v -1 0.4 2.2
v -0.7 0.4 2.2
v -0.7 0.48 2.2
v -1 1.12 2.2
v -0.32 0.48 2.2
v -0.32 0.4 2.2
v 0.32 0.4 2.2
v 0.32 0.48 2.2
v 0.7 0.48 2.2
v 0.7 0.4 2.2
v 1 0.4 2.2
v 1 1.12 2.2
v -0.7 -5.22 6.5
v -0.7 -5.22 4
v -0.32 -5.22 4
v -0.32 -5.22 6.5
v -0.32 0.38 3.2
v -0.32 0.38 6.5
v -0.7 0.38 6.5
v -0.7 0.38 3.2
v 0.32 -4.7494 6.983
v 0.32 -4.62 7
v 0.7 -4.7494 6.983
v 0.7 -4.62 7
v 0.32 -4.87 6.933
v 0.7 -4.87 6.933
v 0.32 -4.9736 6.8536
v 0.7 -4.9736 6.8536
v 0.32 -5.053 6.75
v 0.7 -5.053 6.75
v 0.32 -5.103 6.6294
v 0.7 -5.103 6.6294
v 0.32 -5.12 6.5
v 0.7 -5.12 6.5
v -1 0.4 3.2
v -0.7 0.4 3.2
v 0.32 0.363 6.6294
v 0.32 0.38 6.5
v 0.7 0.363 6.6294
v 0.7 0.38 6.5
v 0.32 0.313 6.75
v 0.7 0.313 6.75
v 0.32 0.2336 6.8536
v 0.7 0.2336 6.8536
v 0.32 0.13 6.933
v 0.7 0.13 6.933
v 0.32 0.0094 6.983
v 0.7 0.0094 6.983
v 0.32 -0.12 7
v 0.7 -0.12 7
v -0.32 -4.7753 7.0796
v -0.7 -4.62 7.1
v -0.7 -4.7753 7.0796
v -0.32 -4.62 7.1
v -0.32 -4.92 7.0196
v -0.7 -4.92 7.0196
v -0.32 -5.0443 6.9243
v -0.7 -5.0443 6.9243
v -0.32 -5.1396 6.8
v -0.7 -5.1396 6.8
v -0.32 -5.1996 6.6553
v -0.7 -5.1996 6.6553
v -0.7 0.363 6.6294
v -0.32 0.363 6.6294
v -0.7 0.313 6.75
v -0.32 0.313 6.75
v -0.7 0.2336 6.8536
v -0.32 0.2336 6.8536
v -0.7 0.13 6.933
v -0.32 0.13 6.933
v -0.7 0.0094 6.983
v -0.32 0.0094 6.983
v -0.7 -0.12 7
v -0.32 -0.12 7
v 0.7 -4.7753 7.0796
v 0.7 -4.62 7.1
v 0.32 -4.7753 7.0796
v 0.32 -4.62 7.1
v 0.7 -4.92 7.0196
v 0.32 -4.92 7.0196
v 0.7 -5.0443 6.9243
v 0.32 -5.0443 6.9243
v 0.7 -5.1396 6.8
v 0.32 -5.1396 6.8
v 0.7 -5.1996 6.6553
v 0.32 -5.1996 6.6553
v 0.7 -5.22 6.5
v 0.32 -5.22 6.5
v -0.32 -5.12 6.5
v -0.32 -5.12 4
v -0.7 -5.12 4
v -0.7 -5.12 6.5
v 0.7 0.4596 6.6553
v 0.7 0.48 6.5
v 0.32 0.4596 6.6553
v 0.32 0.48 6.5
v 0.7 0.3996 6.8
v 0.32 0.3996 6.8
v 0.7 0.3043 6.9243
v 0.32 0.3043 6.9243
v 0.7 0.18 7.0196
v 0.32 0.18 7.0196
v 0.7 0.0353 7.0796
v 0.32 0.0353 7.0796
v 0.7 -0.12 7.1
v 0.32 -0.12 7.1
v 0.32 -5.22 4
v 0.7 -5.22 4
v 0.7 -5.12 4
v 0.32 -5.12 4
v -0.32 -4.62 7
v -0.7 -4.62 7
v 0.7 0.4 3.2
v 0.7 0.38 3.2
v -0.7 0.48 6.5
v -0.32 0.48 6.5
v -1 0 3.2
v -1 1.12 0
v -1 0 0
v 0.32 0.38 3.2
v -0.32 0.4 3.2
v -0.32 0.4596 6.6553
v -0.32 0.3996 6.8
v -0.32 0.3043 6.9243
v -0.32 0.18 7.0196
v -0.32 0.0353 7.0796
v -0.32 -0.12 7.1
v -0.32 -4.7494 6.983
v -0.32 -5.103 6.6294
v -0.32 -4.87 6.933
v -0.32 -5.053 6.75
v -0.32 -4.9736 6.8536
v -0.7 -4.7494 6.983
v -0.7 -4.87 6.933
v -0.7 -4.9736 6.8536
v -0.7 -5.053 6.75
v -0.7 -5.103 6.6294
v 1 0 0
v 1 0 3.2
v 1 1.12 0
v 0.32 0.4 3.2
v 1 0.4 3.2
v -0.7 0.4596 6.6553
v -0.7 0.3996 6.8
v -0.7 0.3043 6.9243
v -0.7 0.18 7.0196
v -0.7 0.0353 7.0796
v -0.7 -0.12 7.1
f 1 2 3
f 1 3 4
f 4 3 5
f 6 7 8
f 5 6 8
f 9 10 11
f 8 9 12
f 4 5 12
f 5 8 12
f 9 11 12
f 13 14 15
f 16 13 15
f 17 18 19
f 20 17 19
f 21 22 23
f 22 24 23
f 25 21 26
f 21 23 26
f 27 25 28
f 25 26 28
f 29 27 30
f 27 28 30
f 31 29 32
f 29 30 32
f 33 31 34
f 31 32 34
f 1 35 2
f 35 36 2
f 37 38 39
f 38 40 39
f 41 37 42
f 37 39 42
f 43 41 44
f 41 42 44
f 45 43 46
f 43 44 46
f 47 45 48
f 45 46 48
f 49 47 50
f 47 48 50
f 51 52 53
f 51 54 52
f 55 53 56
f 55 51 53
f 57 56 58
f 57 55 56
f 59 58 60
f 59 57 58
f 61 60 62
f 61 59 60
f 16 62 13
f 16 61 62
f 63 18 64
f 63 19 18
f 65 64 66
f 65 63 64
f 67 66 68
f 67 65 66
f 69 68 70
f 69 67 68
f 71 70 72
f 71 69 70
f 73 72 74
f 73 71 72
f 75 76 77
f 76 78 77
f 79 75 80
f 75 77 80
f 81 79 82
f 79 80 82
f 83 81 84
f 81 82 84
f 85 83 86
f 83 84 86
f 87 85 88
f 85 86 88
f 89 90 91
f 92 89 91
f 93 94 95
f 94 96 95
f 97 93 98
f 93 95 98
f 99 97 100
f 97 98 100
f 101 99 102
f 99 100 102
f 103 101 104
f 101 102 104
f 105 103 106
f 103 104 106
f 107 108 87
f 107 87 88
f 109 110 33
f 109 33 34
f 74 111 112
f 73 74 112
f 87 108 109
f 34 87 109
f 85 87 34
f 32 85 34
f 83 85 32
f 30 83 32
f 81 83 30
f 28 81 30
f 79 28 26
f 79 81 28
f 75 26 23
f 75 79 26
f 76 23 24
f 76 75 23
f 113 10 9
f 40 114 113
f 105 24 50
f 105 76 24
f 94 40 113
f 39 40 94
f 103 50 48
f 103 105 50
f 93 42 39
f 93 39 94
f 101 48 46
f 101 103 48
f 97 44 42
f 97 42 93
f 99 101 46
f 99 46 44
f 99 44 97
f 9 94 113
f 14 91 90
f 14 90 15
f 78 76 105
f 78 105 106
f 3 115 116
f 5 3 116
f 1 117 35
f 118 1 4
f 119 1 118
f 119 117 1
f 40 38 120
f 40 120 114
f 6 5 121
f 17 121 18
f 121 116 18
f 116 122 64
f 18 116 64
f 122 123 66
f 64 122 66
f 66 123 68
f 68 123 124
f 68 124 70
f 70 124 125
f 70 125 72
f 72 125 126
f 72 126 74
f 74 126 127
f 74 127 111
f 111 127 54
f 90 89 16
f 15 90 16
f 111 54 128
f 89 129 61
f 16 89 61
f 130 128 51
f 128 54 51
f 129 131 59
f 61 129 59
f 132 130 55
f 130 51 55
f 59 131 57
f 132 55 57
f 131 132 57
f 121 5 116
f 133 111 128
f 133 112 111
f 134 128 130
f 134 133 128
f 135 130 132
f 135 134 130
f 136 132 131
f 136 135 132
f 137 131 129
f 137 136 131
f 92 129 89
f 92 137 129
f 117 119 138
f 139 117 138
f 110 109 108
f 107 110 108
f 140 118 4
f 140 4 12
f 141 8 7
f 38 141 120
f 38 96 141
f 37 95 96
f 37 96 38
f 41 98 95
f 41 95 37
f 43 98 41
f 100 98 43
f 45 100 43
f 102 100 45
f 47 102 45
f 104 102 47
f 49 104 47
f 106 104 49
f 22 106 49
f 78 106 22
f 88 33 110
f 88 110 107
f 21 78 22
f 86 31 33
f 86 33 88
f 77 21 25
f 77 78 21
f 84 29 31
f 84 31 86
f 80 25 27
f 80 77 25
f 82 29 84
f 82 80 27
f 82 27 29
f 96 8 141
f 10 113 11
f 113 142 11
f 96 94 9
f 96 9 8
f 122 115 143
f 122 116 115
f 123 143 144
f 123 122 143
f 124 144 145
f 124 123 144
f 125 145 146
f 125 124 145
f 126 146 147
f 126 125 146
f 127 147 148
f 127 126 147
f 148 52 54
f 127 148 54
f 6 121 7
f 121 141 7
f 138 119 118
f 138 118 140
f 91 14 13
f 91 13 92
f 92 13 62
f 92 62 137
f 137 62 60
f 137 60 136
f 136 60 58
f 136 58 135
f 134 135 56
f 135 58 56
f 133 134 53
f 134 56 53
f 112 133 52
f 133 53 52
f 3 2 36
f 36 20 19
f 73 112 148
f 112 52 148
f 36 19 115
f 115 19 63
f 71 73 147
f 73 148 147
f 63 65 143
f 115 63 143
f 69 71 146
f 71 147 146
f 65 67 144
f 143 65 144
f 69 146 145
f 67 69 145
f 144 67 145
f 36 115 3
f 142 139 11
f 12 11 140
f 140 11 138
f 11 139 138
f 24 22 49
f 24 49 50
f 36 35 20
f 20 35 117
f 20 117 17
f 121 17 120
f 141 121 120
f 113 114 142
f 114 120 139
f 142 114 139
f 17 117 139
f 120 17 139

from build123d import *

# Parameters (mm, degrees)
SKETCH1_W           = 2
SKETCH1_H           = 3.2
BOSS_EXTRUDE1_DEPTH = 1.12
SKETCH2_W           = 1.433816818
SKETCH2_H           = 1.065005429
CUT_EXTRUDE1_DEPTH  = 5
SKETCH3_W           = 0.38
SKETCH3_H           = 0.1


with BuildPart() as part:
    # Sketch1 → Boss-Extrude1 (new body)
    with BuildSketch(Plane(origin=(0, 0, 0), x_dir=(1, 0, 0), z_dir=(0, 1, 0))):
        with Locations((0, -1.6)):
            Rectangle(SKETCH1_W, SKETCH1_H)
    extrude(amount=BOSS_EXTRUDE1_DEPTH)

    # Sketch2 → Cut-Extrude1 (cut, symmetric)
    with BuildSketch(Plane(origin=(0, 0, 0), x_dir=(0, 0, -1), z_dir=(1, 0, 0))):
        with Locations((-2.916908409, 0.932502714)):
            Rectangle(SKETCH2_W, SKETCH2_H)
    extrude(amount=CUT_EXTRUDE1_DEPTH, both=True, mode=Mode.SUBTRACT)

    # Sweep1: sweep along a curve in space
    with BuildLine() as sweep1_path:
        Line((0.51, 0.38, 2.2), (0.51, 0.38, 6.5))
        ThreePointArc((0.51, 0.38, 6.5), (0.51, 0.233553391, 6.853553391), (0.51, -0.12, 7))
        Line((0.51, -0.12, 7), (0.51, -4.62, 7))
        ThreePointArc((0.51, -4.62, 7), (0.51, -4.973553391, 6.853553391), (0.51, -5.12, 6.5))
        Line((0.51, -5.12, 6.5), (0.51, -5.12, 4))
    # Sketch3 → Sweep1 (sweep)
    with BuildSketch(Plane.XY.offset(2.2)):
        with Locations((0.51, 0.43)):
            Rectangle(SKETCH3_W, SKETCH3_H)
    sweep1 = sweep(path=sweep1_path.line)

    # Mirror1: Sweep1 across plane
    add(sweep1.mirror(Plane(origin=(0, 0, 0), x_dir=(0, 0, 1), z_dir=(1, 0, 0))))


solid = part.part
